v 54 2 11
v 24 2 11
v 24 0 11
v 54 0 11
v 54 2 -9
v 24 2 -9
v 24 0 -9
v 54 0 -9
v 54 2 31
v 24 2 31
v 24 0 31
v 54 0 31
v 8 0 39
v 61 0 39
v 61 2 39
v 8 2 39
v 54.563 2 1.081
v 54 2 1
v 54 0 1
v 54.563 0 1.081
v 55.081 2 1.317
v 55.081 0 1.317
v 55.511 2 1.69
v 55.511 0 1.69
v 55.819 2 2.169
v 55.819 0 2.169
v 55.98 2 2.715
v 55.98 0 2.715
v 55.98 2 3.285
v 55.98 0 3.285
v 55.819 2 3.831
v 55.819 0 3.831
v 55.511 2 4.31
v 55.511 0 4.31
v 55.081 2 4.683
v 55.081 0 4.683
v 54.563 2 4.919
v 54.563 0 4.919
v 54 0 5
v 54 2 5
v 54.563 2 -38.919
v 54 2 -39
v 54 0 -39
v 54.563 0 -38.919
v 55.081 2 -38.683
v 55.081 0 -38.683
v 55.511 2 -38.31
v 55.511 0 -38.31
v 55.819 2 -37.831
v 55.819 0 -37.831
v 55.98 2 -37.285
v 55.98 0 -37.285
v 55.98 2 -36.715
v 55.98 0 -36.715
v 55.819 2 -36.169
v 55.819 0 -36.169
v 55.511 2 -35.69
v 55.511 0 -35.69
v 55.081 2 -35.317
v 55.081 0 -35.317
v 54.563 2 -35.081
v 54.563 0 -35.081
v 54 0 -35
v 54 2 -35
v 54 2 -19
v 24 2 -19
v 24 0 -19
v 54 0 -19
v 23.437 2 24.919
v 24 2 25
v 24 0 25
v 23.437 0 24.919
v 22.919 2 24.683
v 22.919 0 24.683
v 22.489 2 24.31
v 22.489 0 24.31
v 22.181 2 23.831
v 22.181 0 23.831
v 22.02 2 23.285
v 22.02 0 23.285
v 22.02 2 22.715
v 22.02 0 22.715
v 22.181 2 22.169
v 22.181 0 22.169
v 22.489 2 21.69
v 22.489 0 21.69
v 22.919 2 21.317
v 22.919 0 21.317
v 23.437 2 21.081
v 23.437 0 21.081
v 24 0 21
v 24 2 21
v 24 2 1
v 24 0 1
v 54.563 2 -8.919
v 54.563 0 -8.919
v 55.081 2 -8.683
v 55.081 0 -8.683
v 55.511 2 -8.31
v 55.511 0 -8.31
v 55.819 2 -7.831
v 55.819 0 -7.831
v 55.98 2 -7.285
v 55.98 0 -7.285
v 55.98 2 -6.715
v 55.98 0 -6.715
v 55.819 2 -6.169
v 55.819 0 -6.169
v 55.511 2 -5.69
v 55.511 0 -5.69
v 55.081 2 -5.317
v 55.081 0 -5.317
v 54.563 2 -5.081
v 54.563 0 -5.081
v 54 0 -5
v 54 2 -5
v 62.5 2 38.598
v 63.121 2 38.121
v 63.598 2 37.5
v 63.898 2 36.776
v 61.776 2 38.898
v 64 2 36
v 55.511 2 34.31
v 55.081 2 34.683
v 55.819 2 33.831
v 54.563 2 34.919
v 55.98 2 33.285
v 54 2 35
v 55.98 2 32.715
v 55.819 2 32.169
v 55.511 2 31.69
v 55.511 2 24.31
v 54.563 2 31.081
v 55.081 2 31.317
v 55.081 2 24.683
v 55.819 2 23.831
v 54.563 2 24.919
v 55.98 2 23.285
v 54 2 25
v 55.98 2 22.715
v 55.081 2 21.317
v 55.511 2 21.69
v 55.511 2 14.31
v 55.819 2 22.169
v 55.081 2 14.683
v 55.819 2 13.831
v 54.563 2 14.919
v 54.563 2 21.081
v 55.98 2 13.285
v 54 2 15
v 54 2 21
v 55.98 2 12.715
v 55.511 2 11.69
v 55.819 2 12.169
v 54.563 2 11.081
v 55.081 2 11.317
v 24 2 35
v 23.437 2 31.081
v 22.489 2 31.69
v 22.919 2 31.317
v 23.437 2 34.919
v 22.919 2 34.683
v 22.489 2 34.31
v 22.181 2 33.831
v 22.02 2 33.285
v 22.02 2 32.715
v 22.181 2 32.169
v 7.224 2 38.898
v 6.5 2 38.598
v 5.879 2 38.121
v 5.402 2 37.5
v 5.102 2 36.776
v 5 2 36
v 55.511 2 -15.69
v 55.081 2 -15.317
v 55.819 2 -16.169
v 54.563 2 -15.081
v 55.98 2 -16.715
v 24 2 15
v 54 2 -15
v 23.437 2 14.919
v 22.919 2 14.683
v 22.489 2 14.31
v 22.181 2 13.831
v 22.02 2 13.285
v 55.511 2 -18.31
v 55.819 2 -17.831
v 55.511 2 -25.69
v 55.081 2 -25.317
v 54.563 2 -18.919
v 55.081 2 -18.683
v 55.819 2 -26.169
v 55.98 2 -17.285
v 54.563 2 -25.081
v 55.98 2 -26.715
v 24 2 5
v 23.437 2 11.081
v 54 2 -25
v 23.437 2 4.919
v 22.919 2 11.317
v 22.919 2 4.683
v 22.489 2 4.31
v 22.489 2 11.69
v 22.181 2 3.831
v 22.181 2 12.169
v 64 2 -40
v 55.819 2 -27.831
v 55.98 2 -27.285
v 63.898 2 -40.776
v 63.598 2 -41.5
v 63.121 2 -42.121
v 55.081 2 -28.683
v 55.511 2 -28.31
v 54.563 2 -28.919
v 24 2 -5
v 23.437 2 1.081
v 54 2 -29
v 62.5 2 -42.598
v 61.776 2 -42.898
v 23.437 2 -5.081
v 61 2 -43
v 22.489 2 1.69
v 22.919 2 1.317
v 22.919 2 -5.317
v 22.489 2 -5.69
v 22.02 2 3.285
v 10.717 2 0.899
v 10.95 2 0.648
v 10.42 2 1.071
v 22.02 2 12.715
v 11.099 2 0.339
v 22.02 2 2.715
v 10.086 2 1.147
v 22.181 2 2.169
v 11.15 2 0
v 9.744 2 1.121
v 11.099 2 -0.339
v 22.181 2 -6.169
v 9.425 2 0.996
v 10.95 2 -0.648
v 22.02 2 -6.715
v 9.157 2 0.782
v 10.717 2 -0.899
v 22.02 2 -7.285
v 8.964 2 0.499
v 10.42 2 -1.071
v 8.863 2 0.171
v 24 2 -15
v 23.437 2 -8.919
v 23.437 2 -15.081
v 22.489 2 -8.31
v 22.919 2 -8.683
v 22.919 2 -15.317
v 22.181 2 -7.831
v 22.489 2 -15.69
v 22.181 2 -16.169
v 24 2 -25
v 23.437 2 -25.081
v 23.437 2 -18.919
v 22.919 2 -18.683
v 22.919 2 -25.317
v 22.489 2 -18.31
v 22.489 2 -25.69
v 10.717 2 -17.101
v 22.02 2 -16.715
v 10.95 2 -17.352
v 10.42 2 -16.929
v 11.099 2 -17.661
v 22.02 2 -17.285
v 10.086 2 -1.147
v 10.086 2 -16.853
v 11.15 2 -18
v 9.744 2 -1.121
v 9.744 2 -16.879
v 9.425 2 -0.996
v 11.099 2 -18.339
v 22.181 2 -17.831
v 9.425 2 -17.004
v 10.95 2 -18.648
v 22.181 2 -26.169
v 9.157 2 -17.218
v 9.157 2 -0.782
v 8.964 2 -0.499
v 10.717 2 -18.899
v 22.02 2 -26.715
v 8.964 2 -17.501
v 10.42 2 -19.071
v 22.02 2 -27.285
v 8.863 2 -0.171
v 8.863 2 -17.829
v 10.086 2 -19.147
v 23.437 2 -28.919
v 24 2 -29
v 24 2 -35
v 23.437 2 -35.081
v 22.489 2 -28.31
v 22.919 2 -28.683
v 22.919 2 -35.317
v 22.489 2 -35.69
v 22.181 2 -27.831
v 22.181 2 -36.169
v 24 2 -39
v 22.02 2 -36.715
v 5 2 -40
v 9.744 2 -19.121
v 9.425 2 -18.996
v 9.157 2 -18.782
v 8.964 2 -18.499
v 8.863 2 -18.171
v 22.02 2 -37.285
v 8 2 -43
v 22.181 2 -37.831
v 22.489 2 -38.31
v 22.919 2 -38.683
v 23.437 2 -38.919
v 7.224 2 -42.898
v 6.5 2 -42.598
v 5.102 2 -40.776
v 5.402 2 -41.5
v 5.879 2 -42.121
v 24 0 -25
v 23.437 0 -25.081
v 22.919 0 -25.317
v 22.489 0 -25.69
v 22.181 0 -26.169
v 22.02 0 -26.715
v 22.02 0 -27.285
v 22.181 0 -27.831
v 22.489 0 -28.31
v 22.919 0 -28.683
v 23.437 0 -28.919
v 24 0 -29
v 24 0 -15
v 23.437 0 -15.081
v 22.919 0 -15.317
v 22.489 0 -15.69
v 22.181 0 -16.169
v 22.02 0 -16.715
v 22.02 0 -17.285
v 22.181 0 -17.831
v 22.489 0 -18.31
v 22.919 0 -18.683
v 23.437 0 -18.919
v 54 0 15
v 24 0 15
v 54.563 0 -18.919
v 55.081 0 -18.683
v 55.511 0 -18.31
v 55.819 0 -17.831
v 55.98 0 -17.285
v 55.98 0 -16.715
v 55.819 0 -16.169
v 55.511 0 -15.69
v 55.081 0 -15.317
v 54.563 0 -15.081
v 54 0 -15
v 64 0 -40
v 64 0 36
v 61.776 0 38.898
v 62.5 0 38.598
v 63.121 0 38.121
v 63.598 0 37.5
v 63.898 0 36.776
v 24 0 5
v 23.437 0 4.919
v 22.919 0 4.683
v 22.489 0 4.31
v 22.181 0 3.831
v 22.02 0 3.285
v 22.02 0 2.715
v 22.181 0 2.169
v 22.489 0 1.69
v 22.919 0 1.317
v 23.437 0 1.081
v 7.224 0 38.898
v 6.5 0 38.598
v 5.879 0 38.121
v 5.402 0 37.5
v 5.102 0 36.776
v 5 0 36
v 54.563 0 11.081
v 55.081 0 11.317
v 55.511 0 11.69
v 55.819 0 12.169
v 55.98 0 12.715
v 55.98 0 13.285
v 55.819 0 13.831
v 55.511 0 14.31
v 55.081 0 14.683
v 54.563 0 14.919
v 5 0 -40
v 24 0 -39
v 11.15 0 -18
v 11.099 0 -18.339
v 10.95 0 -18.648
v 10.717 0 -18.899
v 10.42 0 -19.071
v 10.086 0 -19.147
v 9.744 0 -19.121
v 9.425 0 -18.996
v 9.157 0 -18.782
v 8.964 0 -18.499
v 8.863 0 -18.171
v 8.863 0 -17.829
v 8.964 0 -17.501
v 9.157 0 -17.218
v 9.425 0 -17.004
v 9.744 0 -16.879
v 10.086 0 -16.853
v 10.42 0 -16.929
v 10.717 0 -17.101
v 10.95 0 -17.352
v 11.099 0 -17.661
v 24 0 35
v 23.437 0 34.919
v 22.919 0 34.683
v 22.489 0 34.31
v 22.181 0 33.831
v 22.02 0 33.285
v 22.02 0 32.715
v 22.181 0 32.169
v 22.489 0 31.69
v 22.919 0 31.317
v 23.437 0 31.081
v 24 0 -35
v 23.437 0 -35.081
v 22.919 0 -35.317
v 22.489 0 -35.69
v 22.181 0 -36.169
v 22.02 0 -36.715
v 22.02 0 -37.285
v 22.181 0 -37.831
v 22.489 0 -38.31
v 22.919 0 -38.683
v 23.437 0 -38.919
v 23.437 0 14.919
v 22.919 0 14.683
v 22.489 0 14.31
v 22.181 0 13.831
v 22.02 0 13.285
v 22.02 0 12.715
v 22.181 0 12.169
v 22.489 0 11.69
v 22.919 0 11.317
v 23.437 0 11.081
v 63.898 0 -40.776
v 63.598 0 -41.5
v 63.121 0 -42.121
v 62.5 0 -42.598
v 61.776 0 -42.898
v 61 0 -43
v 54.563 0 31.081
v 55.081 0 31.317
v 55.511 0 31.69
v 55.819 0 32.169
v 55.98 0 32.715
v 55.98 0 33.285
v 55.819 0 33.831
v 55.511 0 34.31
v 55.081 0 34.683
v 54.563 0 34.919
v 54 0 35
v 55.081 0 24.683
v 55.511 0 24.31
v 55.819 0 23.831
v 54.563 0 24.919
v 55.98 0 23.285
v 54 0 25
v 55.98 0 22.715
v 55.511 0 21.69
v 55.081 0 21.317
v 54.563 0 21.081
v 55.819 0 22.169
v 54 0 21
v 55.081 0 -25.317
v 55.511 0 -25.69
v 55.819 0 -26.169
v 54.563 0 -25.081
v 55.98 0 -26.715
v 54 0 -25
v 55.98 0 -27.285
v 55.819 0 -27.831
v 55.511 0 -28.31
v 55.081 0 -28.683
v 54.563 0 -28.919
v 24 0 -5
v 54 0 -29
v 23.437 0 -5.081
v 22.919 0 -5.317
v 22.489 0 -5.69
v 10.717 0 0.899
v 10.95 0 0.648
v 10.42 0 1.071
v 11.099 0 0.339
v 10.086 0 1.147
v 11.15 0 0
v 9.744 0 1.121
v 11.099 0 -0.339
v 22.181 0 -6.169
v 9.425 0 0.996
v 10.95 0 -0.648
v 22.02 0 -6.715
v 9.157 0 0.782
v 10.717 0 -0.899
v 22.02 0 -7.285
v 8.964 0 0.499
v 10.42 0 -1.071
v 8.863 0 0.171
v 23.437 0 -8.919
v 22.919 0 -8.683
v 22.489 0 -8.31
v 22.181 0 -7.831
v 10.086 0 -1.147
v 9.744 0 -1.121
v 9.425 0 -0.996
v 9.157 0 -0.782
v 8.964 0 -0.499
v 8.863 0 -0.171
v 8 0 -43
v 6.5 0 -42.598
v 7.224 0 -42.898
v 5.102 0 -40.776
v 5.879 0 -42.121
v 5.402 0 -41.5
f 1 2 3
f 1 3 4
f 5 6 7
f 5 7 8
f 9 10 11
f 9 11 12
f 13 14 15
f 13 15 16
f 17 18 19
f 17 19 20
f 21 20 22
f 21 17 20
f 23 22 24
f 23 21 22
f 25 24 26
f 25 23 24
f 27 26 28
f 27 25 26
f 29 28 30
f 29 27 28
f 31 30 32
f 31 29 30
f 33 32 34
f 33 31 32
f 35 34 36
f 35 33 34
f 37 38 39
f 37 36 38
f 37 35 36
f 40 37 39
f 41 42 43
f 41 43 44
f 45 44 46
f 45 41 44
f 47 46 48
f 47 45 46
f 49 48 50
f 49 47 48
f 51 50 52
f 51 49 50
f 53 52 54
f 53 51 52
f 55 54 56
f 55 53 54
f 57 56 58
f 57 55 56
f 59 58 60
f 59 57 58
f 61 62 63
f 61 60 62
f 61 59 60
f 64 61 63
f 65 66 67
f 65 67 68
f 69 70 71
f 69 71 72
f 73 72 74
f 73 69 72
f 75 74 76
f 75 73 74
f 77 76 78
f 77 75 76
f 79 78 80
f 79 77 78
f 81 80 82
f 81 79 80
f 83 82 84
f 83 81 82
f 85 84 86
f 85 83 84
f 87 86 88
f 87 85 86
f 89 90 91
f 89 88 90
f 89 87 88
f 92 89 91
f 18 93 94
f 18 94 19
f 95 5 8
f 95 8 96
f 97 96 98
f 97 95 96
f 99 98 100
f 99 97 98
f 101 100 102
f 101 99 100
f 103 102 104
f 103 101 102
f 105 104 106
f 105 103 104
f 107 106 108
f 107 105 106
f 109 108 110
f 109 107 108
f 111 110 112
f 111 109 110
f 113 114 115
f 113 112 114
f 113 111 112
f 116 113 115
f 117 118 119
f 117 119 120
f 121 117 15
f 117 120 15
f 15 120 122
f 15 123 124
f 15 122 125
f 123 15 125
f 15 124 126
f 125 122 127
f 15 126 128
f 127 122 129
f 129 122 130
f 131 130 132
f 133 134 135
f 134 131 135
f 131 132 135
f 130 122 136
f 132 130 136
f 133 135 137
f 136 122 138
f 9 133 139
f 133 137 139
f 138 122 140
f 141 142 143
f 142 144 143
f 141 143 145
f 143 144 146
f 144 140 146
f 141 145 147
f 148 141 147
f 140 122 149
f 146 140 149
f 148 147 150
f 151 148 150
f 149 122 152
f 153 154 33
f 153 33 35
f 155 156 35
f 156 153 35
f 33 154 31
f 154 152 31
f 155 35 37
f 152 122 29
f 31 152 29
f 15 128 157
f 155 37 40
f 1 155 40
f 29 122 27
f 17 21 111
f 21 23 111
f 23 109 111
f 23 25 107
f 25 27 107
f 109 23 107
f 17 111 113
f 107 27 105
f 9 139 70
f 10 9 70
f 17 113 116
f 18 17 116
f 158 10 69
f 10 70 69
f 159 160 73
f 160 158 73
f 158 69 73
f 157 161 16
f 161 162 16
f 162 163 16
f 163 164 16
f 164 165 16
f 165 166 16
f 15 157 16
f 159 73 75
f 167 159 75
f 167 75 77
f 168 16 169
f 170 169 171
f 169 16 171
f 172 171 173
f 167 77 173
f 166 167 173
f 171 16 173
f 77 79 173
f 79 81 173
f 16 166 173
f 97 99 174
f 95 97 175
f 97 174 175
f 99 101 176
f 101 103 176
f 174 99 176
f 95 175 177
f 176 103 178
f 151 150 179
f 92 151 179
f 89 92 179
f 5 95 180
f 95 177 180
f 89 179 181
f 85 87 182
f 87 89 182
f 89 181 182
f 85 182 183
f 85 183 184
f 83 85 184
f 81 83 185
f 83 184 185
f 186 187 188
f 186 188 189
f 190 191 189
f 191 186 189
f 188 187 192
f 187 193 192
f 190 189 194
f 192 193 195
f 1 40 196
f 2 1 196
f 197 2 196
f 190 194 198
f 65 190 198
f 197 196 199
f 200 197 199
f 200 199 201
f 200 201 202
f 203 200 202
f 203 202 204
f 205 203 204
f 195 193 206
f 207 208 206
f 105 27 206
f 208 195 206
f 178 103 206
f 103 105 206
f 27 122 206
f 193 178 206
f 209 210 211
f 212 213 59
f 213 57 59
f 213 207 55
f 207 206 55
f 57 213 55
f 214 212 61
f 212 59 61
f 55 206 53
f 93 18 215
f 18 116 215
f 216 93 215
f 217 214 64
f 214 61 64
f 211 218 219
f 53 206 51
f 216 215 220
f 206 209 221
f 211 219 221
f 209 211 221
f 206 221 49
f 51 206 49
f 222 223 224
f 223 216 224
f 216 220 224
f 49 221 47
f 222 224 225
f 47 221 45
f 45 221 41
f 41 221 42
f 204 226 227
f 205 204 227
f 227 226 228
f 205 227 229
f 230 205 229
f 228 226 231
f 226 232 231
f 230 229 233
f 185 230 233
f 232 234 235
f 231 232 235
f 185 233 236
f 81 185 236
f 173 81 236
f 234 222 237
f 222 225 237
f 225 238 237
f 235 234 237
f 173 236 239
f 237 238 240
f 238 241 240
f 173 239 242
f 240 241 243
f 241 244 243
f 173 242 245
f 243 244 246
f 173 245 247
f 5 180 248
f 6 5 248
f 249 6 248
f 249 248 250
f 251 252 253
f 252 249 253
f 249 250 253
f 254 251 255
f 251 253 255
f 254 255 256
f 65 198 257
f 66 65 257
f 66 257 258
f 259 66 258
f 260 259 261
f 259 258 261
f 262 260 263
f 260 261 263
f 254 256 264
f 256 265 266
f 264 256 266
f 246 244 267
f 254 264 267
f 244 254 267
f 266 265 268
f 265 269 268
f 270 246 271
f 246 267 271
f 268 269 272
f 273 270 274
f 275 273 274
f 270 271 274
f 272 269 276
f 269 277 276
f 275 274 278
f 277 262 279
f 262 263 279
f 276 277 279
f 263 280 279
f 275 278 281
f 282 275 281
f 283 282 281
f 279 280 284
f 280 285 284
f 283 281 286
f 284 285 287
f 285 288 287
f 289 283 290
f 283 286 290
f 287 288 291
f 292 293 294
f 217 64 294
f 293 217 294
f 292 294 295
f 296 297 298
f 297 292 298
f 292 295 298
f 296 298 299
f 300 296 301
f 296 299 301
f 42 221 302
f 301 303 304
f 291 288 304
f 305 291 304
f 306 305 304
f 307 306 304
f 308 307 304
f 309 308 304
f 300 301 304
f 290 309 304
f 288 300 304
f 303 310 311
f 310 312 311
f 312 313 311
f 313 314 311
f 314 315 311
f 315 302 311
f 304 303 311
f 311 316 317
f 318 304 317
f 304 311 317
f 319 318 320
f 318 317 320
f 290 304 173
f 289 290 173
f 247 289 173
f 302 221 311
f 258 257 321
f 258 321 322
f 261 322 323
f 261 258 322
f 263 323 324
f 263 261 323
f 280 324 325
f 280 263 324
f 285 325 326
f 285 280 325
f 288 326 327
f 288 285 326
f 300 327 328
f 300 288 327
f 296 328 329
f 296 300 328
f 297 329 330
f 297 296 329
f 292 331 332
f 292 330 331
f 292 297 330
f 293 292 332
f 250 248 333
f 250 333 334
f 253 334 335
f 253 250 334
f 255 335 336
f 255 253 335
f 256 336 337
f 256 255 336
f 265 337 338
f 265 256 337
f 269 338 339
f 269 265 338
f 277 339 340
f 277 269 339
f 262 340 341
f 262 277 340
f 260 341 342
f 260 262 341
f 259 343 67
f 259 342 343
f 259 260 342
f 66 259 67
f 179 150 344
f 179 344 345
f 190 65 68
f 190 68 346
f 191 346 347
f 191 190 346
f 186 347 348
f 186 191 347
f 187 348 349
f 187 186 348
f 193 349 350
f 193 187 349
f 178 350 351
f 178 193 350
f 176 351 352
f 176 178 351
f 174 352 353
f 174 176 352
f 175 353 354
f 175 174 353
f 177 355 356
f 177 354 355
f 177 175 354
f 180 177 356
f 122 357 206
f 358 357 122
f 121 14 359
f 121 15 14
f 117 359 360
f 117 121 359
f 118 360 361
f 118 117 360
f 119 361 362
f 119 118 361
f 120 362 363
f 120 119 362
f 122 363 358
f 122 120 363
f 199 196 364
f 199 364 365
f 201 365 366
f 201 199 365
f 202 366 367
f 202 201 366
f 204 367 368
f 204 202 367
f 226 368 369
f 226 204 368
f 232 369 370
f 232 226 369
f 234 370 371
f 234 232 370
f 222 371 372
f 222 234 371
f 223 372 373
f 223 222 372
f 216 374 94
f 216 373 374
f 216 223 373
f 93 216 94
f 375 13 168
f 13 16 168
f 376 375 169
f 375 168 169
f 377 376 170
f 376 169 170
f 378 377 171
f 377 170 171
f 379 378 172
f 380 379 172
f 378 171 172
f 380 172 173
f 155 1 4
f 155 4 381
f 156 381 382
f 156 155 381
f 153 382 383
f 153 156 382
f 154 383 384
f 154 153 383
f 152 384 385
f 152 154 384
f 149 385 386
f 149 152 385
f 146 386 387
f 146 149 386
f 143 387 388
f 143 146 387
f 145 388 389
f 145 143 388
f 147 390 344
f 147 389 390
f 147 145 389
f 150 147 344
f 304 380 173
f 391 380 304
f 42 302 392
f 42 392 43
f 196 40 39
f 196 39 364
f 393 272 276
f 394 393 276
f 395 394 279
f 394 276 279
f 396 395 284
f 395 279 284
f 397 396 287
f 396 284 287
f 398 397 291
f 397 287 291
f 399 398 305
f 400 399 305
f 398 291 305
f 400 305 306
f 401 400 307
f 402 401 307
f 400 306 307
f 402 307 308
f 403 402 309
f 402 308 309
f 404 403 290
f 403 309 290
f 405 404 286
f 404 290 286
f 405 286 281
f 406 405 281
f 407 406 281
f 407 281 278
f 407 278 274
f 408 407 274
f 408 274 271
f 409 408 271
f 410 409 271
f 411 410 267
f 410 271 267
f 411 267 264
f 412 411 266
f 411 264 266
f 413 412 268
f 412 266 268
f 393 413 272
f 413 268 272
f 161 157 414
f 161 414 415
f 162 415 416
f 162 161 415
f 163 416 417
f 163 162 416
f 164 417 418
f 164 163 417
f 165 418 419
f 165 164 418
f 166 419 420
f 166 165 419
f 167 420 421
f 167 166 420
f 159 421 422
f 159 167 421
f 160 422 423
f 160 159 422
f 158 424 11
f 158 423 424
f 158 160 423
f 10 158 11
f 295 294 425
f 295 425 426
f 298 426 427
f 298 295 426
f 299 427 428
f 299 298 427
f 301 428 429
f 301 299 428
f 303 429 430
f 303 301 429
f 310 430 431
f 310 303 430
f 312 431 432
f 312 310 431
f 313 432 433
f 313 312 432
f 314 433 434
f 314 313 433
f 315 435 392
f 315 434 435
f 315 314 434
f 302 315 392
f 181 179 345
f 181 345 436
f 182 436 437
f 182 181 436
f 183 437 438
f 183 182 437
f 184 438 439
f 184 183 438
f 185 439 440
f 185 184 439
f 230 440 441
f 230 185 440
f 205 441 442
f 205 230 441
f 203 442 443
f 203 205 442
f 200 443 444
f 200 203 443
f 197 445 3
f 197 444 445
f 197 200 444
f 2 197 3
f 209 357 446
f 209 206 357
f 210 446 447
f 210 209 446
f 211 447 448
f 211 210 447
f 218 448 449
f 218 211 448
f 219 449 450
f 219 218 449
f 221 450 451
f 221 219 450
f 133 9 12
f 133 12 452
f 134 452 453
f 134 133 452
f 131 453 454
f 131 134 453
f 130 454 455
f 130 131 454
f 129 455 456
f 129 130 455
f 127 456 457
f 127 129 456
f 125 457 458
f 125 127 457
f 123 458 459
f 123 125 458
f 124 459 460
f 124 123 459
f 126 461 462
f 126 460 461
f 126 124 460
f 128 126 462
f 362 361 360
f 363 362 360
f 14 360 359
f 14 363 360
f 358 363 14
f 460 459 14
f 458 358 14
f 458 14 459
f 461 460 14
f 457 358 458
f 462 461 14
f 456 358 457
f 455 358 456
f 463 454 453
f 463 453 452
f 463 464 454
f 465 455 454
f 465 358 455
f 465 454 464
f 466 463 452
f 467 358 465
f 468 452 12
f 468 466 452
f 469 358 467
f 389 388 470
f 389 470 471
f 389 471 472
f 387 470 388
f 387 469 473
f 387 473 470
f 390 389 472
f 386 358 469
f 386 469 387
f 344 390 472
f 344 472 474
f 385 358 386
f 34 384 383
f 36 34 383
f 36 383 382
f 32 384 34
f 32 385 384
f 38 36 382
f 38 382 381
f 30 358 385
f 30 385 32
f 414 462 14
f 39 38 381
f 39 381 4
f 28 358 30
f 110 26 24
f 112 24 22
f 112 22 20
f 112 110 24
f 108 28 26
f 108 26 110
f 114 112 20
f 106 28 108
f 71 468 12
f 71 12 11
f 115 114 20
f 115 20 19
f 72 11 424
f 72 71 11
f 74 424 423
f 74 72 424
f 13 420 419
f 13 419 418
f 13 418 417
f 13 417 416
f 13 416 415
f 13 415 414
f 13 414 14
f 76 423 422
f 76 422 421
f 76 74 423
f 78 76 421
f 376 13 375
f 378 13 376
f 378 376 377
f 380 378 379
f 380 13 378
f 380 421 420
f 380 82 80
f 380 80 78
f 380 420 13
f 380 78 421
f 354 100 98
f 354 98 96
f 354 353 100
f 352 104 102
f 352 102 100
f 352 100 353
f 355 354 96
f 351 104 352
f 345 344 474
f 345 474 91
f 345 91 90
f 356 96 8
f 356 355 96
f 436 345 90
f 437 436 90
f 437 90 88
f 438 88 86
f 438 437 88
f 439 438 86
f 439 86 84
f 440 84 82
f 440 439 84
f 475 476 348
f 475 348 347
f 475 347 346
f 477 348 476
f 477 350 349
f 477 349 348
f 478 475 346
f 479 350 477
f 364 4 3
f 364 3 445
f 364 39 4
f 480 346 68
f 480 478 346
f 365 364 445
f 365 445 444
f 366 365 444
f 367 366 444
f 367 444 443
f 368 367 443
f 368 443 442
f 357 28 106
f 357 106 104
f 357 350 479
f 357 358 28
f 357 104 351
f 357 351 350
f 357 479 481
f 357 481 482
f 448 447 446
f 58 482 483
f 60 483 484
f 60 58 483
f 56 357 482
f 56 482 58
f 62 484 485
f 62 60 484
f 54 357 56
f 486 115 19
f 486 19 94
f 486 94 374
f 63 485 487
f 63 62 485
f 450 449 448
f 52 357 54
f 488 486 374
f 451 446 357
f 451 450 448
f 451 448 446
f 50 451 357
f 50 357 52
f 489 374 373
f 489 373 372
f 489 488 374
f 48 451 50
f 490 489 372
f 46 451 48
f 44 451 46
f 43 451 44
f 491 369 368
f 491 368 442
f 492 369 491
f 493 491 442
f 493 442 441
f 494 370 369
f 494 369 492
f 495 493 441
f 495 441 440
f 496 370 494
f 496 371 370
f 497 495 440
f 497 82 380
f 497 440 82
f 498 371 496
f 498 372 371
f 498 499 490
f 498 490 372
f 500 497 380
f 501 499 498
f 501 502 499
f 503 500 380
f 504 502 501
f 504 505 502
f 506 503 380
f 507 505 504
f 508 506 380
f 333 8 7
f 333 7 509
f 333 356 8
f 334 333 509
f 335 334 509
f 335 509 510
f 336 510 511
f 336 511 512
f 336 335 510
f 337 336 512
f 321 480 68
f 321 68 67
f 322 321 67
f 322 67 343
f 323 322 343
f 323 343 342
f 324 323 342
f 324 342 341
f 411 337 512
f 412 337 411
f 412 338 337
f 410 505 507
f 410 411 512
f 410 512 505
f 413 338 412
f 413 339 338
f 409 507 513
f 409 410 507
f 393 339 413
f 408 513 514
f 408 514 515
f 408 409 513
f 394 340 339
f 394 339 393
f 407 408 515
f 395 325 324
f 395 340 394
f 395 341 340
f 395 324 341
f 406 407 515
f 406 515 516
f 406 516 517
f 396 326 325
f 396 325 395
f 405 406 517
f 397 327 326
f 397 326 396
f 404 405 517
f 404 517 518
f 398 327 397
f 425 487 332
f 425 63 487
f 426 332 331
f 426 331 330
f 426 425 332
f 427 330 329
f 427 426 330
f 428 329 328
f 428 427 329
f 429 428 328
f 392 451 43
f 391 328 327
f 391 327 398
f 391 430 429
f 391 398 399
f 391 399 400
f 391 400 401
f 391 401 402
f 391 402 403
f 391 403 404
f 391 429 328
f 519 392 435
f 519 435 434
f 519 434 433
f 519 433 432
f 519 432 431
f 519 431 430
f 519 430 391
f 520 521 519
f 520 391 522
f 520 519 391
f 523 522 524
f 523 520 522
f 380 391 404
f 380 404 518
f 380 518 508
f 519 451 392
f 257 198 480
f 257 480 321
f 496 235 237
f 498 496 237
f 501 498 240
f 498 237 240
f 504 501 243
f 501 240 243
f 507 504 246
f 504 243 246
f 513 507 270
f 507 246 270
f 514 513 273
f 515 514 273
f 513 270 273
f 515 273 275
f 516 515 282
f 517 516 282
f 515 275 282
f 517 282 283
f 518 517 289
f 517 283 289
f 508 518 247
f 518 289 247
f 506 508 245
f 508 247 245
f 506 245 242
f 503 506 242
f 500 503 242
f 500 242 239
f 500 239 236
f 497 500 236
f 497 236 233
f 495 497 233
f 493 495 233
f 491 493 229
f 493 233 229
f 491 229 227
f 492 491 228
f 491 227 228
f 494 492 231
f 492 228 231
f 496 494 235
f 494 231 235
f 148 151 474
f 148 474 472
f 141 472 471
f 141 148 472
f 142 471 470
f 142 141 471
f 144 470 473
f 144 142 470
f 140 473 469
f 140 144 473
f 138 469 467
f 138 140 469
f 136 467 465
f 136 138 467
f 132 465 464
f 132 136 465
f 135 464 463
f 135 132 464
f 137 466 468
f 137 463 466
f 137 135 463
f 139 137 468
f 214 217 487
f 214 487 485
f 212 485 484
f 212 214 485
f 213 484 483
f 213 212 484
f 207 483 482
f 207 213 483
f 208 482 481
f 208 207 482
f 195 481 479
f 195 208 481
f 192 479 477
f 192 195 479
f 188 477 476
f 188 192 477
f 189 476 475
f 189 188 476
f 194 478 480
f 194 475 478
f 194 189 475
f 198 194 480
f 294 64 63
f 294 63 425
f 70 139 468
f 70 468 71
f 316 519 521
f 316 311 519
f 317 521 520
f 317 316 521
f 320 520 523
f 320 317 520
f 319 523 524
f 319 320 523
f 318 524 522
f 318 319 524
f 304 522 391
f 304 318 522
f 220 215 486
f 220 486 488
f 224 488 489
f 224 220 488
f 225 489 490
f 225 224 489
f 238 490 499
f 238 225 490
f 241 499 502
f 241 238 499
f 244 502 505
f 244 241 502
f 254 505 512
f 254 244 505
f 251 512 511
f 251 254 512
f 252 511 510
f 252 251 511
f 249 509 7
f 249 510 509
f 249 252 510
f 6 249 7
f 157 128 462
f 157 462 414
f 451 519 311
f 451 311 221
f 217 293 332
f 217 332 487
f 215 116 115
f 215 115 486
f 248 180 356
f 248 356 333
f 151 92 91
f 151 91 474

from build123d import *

# Parameters (mm, degrees)
SKETCH_1_R          = 1.15
EXTRUDE_1_DEPTH     = 2
FILLET_1_R          = 3
SKETCH_2_R          = 1.15
CUT_EXTRUDE_1_DEPTH = 2
SKETCH_3_W          = 9
SKETCH_3_H          = 30
CUT_EXTRUDE_2_DEPTH = 2
CUT_EXTRUDE_3_DEPTH = 3


with BuildPart() as part:
    # 草图1 → 凸台-拉伸1 (new body)
    with BuildSketch(Plane(origin=(0, 0, 0), x_dir=(1, 0, 0), z_dir=(0, 1, 0))):
        Polygon((64, -39), (5, -39), (5, -3), (-4, -3), (-4, 21), (5, 21), (5, 43), (64, 43), align=None)
        Circle(SKETCH_1_R, mode=Mode.SUBTRACT)
        with Locations((0, 18)):
            Circle(SKETCH_1_R, mode=Mode.SUBTRACT)
    extrude(amount=EXTRUDE_1_DEPTH)

    # 圆角1
    fillet_1_edges = [part.edges().sort_by_distance(p)[0] for p in [
        (5, 1, -43),
        (64, 1, -43),
        (64, 1, 39),
        (5, 1, 39),
        (5, 1, 3),
        (-4, 1, 3),
        (-4, 1, -21),
        (5, 1, -21),
    ]]
    fillet(fillet_1_edges, radius=FILLET_1_R)

    # 草图2 → 切除-拉伸1 (cut)
    with BuildSketch(Plane(origin=(0, 2, 0), x_dir=(1, 0, 0), z_dir=(0, 1, 0))):
        with Locations((10, 18)):
            Circle(SKETCH_2_R)
        with Locations((10, 0)):
            Circle(SKETCH_2_R)
    extrude(amount=-CUT_EXTRUDE_1_DEPTH, mode=Mode.SUBTRACT)

    # 草图3 → 切除-拉伸2 (cut)
    with BuildSketch(Plane(origin=(0, 2, 0), x_dir=(1, 0, 0), z_dir=(0, 1, 0))):
        with Locations((0.5, 9)):
            Rectangle(SKETCH_3_W, SKETCH_3_H)
    extrude(amount=-CUT_EXTRUDE_2_DEPTH, mode=Mode.SUBTRACT)

    # 草图4 → 切除-拉伸3 (cut, through all)
    with BuildSketch(Plane(origin=(0, 2, 0), x_dir=(1, 0, 0), z_dir=(0, 1, 0))):
        with BuildLine():
            Line((24, 39), (54, 39))
            ThreePointArc((54, 39), (56, 37), (54, 35))
            Line((54, 35), (24, 35))
            ThreePointArc((24, 35), (22, 37), (24, 39))
        make_face()
        with BuildLine():
            Line((24, 29), (54, 29))
            ThreePointArc((54, 29), (56, 27), (54, 25))
            Line((54, 25), (24, 25))
            ThreePointArc((24, 25), (22, 27), (24, 29))
        make_face()
        with BuildLine():
            Line((24, 19), (54, 19))
            ThreePointArc((54, 19), (56, 17), (54, 15))
            Line((54, 15), (24, 15))
            ThreePointArc((24, 15), (22, 17), (24, 19))
        make_face()
        with BuildLine():
            Line((24, 9), (54, 9))
            ThreePointArc((54, 9), (56, 7), (54, 5))
            Line((54, 5), (24, 5))
            ThreePointArc((24, 5), (22, 7), (24, 9))
        make_face()
        with BuildLine():
            Line((24, -1), (54, -1))
            ThreePointArc((54, -1), (56, -3), (54, -5))
            Line((54, -5), (24, -5))
            ThreePointArc((24, -5), (22, -3), (24, -1))
        make_face()
        with BuildLine():
            Line((24, -11), (54, -11))
            ThreePointArc((54, -11), (56, -13), (54, -15))
            Line((54, -15), (24, -15))
            ThreePointArc((24, -15), (22, -13), (24, -11))
        make_face()
        with BuildLine():
            Line((24, -21), (54, -21))
            ThreePointArc((54, -21), (56, -23), (54, -25))
            Line((54, -25), (24, -25))
            ThreePointArc((24, -25), (22, -23), (24, -21))
        make_face()
        with BuildLine():
            Line((24, -31), (54, -31))
            ThreePointArc((54, -31), (56, -33), (54, -35))
            Line((54, -35), (24, -35))
            ThreePointArc((24, -35), (22, -33), (24, -31))
        make_face()
    extrude(amount=-CUT_EXTRUDE_3_DEPTH, mode=Mode.SUBTRACT)


solid = part.part
